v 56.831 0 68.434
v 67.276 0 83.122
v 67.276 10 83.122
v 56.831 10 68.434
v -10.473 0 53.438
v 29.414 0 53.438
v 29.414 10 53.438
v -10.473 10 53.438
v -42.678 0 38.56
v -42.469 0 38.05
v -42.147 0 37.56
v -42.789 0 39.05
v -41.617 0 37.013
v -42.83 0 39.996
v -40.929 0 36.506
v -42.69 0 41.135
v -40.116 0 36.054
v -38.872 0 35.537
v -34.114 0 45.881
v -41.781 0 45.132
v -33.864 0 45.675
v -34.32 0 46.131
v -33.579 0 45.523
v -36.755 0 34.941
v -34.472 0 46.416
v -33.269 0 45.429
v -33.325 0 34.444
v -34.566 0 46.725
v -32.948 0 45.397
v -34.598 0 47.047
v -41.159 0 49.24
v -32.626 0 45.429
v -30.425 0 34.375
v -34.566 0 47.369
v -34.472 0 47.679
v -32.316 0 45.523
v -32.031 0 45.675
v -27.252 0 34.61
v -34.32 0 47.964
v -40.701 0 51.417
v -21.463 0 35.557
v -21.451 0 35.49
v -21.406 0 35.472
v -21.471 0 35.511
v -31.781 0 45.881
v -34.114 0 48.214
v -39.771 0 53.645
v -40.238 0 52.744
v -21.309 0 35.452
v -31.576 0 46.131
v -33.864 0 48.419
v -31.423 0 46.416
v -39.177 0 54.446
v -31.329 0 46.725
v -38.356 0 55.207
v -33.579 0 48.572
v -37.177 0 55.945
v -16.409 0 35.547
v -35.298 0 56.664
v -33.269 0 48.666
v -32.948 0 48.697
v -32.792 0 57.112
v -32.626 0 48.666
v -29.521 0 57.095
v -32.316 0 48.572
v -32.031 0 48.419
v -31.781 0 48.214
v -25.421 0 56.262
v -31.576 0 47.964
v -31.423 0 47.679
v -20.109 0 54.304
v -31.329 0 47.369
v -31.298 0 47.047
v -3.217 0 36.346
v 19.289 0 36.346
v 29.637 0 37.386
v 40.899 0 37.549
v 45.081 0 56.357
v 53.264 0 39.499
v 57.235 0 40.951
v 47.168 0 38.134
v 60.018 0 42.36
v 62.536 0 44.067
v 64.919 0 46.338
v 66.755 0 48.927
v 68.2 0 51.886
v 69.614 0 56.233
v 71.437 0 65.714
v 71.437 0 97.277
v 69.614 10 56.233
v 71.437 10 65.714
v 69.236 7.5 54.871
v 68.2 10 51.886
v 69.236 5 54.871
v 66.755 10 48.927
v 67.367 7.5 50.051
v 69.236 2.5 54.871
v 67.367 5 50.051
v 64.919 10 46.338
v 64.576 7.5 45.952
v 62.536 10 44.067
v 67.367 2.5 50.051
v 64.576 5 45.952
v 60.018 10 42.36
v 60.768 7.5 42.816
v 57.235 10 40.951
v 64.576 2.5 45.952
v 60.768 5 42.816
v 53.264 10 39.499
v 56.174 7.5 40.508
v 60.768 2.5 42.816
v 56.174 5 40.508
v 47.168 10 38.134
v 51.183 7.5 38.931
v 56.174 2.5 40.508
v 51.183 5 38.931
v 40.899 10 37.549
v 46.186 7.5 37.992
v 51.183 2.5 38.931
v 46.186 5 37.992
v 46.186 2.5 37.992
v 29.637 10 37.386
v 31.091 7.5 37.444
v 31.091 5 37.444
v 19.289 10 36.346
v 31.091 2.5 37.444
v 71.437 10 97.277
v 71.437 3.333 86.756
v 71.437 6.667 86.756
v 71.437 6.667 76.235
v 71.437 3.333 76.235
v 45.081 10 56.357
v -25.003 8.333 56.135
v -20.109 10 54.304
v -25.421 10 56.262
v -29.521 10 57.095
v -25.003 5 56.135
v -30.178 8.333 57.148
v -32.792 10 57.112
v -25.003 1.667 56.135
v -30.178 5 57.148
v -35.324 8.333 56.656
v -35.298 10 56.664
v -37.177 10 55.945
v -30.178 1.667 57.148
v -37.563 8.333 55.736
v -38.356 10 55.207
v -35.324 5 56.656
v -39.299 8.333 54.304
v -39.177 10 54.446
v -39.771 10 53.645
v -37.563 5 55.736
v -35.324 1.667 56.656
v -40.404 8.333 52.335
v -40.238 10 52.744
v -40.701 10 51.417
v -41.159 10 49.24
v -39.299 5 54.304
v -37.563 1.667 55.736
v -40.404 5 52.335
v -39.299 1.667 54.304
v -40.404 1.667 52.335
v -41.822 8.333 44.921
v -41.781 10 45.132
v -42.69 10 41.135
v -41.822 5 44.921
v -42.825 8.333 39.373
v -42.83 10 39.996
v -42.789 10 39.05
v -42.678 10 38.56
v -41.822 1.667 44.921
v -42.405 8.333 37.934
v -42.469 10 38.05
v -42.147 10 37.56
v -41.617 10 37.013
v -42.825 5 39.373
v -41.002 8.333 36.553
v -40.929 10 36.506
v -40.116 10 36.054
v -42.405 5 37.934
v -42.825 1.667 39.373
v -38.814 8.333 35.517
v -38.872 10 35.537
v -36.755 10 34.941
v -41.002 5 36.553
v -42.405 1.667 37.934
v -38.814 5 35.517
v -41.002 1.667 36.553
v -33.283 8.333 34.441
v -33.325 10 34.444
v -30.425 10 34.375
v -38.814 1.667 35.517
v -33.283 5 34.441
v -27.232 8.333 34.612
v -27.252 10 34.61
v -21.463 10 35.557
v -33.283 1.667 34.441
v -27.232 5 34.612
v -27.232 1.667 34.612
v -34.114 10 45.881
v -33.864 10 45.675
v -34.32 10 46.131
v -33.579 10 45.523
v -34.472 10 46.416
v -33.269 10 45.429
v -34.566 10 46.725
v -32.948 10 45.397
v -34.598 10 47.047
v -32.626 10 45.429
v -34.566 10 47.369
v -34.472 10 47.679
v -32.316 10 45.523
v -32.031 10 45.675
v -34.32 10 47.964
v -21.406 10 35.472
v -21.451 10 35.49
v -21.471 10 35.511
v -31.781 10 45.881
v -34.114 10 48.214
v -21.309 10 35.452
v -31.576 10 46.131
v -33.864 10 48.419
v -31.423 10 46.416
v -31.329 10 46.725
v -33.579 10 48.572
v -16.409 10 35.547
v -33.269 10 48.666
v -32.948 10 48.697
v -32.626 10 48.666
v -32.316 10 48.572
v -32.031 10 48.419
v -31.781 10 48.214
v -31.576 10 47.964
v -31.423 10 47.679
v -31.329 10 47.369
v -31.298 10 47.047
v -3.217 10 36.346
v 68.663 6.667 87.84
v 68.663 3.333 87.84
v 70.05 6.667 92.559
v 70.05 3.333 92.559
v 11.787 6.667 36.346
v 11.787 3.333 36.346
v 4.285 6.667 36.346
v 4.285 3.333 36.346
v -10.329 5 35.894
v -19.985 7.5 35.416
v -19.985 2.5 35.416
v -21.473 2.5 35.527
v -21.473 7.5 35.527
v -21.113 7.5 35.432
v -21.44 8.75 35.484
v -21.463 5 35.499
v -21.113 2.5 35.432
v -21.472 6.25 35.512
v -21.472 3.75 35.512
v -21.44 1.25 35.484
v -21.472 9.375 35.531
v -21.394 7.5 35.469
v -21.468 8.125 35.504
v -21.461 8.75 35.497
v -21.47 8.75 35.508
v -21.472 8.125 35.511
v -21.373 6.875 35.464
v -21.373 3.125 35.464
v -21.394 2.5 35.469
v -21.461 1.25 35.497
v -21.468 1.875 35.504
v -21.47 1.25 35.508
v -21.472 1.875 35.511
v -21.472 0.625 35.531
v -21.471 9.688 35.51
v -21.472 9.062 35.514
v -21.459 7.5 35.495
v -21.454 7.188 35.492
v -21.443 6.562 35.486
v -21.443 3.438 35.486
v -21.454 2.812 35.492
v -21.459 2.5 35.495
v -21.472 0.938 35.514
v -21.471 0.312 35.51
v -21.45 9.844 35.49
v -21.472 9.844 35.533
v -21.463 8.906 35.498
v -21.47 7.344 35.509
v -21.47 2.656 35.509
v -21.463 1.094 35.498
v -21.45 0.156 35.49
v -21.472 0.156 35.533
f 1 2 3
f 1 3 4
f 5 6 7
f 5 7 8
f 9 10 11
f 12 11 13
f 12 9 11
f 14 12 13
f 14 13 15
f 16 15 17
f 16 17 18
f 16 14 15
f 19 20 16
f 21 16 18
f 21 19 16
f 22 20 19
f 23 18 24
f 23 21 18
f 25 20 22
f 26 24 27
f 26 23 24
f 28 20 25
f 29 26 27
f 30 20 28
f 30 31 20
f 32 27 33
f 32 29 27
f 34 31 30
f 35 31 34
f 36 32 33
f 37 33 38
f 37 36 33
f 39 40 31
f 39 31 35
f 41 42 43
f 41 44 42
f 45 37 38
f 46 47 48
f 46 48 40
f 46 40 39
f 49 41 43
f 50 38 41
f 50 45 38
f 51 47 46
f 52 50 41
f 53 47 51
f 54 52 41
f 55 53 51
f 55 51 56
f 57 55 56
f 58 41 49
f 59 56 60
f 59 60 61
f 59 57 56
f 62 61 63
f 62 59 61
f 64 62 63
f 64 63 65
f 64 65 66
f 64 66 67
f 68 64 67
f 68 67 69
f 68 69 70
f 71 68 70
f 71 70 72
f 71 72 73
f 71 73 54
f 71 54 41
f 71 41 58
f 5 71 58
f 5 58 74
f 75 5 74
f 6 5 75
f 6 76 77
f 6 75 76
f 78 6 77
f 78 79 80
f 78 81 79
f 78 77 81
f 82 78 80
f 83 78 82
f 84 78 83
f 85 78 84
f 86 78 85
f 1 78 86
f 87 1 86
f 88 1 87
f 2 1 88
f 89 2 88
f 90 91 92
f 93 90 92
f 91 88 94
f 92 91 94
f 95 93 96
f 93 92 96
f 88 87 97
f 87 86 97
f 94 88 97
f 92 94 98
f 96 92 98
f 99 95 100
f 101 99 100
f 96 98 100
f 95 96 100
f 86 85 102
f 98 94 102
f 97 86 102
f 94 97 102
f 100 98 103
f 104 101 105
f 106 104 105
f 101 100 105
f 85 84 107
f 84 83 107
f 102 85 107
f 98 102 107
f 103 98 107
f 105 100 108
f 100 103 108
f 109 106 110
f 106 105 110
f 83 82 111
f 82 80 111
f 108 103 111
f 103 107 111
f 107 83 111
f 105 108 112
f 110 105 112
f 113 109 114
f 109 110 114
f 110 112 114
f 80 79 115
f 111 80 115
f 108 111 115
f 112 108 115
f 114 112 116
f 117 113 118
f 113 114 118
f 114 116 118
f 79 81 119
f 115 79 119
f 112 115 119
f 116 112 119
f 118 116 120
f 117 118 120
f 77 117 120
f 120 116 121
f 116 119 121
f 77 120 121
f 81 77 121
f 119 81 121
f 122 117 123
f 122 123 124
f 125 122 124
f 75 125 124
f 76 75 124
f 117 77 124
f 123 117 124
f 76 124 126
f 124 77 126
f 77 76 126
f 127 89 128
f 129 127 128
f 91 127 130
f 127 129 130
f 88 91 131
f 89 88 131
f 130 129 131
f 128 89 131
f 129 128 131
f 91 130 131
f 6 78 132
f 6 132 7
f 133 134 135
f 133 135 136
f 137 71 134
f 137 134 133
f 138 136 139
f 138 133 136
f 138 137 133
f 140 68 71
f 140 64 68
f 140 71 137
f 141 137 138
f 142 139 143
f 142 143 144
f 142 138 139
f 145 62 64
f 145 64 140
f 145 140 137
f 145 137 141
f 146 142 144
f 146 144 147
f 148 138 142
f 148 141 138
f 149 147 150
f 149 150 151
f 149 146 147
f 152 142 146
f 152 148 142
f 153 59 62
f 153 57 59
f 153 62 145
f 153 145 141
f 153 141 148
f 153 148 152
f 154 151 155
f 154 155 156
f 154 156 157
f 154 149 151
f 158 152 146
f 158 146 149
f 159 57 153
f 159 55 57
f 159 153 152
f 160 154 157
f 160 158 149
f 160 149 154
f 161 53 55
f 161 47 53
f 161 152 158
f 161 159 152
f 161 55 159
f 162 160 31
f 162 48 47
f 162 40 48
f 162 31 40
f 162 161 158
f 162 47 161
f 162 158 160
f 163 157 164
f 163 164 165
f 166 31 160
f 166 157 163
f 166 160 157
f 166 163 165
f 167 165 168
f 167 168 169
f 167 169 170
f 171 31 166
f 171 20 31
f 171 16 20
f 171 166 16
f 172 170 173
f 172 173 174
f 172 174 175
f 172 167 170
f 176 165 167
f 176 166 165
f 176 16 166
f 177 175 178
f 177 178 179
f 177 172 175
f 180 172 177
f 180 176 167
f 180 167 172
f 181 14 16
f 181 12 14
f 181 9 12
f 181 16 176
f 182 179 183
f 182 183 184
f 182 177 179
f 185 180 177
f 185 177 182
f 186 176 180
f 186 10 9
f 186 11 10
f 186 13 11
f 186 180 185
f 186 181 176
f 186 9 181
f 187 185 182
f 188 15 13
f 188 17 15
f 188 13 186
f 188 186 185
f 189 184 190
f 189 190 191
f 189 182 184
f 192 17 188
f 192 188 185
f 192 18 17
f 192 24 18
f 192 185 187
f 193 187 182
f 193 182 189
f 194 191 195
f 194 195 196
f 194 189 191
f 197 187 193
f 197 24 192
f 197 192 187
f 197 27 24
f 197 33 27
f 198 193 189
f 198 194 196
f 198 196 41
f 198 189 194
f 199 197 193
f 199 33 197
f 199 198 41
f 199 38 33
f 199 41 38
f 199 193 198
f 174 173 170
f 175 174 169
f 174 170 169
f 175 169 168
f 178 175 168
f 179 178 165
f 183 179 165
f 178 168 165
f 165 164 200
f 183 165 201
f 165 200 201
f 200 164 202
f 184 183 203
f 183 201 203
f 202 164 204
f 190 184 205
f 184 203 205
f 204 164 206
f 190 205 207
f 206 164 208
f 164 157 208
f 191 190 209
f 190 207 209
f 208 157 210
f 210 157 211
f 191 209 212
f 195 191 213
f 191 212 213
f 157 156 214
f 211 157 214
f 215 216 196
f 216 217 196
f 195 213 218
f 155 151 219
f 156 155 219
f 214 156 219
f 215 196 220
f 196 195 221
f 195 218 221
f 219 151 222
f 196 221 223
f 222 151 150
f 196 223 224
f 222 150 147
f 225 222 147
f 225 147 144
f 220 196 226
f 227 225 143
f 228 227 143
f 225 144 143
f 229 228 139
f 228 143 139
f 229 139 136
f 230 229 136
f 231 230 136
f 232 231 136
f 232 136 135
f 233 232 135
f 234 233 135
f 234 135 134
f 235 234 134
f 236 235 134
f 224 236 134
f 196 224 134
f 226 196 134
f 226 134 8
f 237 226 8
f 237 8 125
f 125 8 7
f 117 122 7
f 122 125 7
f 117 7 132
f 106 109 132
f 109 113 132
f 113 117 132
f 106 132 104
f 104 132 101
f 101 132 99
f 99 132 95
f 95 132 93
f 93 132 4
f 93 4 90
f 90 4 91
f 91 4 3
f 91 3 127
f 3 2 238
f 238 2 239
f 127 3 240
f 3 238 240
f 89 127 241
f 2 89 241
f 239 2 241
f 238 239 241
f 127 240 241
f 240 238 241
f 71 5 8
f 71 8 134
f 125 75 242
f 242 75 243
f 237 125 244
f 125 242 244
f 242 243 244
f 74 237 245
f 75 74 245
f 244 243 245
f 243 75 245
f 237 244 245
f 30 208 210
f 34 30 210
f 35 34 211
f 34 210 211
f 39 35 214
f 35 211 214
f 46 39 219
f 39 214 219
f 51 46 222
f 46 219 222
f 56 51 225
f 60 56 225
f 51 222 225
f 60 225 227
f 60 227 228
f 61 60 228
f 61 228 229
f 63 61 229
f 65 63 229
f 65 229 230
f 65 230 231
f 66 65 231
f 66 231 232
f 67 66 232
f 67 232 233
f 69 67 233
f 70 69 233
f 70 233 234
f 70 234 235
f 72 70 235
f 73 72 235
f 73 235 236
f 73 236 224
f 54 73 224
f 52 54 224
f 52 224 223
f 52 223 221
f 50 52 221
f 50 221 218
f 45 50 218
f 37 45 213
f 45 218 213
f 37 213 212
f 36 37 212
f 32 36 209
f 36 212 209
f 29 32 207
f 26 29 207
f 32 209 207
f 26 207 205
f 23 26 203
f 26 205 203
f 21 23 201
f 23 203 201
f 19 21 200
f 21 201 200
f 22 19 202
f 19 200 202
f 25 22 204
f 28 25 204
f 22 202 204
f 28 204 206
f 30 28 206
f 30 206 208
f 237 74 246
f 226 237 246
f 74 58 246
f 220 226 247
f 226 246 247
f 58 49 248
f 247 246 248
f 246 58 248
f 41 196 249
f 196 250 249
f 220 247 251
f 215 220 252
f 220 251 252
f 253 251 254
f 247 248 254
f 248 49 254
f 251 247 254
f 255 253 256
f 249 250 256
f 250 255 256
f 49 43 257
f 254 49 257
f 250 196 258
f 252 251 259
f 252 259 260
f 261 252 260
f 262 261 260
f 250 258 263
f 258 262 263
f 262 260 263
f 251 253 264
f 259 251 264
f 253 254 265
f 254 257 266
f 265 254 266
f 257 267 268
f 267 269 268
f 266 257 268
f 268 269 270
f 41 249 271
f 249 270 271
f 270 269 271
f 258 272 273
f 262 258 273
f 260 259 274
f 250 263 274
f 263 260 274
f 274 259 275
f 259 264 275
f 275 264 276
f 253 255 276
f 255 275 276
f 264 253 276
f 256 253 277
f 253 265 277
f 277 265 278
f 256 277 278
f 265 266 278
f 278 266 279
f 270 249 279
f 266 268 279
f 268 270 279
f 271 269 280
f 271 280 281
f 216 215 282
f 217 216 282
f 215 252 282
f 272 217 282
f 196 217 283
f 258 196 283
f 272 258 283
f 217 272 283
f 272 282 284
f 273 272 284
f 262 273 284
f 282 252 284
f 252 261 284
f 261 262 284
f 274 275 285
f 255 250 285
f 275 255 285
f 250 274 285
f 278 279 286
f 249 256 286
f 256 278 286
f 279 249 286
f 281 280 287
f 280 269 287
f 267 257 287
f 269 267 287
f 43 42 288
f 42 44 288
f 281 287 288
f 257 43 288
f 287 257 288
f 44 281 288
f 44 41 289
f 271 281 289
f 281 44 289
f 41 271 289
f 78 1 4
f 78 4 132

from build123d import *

# Parameters (mm, degrees)
F1_DEPTH = 10
F3_D     = 3.3


with BuildPart() as f1:
    # F0 (on Front) → F1 (new body)
    with BuildSketch(Plane.XZ):
        with BuildLine():
            Line((-10.4734804481, 53.4383915365), (-20.1092623174, 54.3038807809))
            add(Edge.make_bspline(
                [(-20.1092623174, 54.3038807809), (-23.3402828463, 55.6152098778), (-29.658978649, 58.1796905384), (-41.2345234756, 55.7829477174), (-41.1390276998, 44.9861024455), (-44.6739675741, 36.8204398298), (-32.5531582873, 33.4764915402), (-25.2779745233, 34.8410426615), (-21.4630607516, 35.5565771461)],
                knots=[0, 0, 0, 0, 0.1733272911, 0.3389648617, 0.50599974, 0.6478866541, 0.8153610828, 1, 1, 1, 1], degree=3))
            add(Edge.make_bspline(
                [(-3.2173215877, 36.3456867635), (-12.1783734817, 35.7678015902), (-21.6430678813, 35.1574372459), (-21.4721554724, 35.5364109116), (-21.4630607516, 35.5565771461)],
                knots=[0, 0, 0, 0, 0.9467872406, 1, 1, 1, 1], degree=3))
            add(Edge.make_bspline(
                [(19.2888658494, 36.3456867635), (11.7868033703, 36.3456867635), (4.2847408913, 36.3456867635), (-3.2173215877, 36.3456867635)],
                knots=[0, 0, 0, 0, 22.5061874371, 22.5061874371, 22.5061874371, 22.5061874371], degree=3))
            add(Edge.make_bspline(
                [(71.4373290539, 65.7135099173), (70.2431957458, 58.2715662658), (67.8803456673, 43.5460770575), (46.1496688485, 36.8484810563), (31.3814852341, 37.8776108572), (23.1536815798, 36.8352915503), (19.2888658494, 36.3456867635)],
                knots=[0, 0, 0, 0, 0.2792343908, 0.5525254155, 0.7898094211, 1, 1, 1, 1], degree=3))
            add(Edge.make_bspline(
                [(71.4373290539, 83.1219926476), (71.4373290539, 77.3191650709), (71.4373290539, 71.5163374941), (71.4373290539, 65.7135099173)],
                knots=[0, 0, 0, 0, 17.4084827304, 17.4084827304, 17.4084827304, 17.4084827304], degree=3))
            add(Edge.make_bspline(
                [(71.4373290539, 97.2770601511), (71.4373290539, 92.5587043166), (71.4373290539, 87.8403484821), (71.4373290539, 83.1219926476)],
                knots=[0, 0, 0, 0, 14.1550675035, 14.1550675035, 14.1550675035, 14.1550675035], degree=3))
            add(Edge.make_bspline(
                [(67.2757327557, 83.1219926476), (68.6629315217, 87.8403484821), (70.0501302878, 92.5587043166), (71.4373290539, 97.2770601511)],
                knots=[0, 0, 0, 0, 14.7541458505, 14.7541458505, 14.7541458505, 14.7541458505], degree=3))
            Line((67.2757327557, 83.1219926476), (56.8310506642, 68.4341490269))
            Line((56.8310506642, 68.4341490269), (45.0807772577, 56.3574768603))
            Line((45.0807772577, 56.3574768603), (29.4137429446, 53.4383915365))
            Line((29.4137429446, 53.4383915365), (20.2746428549, 53.4383915365))
            Line((20.2746428549, 53.4383915365), (-1.8185856752, 53.4383915365))
            Line((-1.8185856752, 53.4383915365), (-10.4734804481, 53.4383915365))
        make_face()
    extrude(amount=-F1_DEPTH)

    # F3 (through all)
    with Locations(Plane.XZ):
        with Locations((-32.9475961626, 47.0472611487)):
            Hole(F3_D / 2)


solid = f1.part
